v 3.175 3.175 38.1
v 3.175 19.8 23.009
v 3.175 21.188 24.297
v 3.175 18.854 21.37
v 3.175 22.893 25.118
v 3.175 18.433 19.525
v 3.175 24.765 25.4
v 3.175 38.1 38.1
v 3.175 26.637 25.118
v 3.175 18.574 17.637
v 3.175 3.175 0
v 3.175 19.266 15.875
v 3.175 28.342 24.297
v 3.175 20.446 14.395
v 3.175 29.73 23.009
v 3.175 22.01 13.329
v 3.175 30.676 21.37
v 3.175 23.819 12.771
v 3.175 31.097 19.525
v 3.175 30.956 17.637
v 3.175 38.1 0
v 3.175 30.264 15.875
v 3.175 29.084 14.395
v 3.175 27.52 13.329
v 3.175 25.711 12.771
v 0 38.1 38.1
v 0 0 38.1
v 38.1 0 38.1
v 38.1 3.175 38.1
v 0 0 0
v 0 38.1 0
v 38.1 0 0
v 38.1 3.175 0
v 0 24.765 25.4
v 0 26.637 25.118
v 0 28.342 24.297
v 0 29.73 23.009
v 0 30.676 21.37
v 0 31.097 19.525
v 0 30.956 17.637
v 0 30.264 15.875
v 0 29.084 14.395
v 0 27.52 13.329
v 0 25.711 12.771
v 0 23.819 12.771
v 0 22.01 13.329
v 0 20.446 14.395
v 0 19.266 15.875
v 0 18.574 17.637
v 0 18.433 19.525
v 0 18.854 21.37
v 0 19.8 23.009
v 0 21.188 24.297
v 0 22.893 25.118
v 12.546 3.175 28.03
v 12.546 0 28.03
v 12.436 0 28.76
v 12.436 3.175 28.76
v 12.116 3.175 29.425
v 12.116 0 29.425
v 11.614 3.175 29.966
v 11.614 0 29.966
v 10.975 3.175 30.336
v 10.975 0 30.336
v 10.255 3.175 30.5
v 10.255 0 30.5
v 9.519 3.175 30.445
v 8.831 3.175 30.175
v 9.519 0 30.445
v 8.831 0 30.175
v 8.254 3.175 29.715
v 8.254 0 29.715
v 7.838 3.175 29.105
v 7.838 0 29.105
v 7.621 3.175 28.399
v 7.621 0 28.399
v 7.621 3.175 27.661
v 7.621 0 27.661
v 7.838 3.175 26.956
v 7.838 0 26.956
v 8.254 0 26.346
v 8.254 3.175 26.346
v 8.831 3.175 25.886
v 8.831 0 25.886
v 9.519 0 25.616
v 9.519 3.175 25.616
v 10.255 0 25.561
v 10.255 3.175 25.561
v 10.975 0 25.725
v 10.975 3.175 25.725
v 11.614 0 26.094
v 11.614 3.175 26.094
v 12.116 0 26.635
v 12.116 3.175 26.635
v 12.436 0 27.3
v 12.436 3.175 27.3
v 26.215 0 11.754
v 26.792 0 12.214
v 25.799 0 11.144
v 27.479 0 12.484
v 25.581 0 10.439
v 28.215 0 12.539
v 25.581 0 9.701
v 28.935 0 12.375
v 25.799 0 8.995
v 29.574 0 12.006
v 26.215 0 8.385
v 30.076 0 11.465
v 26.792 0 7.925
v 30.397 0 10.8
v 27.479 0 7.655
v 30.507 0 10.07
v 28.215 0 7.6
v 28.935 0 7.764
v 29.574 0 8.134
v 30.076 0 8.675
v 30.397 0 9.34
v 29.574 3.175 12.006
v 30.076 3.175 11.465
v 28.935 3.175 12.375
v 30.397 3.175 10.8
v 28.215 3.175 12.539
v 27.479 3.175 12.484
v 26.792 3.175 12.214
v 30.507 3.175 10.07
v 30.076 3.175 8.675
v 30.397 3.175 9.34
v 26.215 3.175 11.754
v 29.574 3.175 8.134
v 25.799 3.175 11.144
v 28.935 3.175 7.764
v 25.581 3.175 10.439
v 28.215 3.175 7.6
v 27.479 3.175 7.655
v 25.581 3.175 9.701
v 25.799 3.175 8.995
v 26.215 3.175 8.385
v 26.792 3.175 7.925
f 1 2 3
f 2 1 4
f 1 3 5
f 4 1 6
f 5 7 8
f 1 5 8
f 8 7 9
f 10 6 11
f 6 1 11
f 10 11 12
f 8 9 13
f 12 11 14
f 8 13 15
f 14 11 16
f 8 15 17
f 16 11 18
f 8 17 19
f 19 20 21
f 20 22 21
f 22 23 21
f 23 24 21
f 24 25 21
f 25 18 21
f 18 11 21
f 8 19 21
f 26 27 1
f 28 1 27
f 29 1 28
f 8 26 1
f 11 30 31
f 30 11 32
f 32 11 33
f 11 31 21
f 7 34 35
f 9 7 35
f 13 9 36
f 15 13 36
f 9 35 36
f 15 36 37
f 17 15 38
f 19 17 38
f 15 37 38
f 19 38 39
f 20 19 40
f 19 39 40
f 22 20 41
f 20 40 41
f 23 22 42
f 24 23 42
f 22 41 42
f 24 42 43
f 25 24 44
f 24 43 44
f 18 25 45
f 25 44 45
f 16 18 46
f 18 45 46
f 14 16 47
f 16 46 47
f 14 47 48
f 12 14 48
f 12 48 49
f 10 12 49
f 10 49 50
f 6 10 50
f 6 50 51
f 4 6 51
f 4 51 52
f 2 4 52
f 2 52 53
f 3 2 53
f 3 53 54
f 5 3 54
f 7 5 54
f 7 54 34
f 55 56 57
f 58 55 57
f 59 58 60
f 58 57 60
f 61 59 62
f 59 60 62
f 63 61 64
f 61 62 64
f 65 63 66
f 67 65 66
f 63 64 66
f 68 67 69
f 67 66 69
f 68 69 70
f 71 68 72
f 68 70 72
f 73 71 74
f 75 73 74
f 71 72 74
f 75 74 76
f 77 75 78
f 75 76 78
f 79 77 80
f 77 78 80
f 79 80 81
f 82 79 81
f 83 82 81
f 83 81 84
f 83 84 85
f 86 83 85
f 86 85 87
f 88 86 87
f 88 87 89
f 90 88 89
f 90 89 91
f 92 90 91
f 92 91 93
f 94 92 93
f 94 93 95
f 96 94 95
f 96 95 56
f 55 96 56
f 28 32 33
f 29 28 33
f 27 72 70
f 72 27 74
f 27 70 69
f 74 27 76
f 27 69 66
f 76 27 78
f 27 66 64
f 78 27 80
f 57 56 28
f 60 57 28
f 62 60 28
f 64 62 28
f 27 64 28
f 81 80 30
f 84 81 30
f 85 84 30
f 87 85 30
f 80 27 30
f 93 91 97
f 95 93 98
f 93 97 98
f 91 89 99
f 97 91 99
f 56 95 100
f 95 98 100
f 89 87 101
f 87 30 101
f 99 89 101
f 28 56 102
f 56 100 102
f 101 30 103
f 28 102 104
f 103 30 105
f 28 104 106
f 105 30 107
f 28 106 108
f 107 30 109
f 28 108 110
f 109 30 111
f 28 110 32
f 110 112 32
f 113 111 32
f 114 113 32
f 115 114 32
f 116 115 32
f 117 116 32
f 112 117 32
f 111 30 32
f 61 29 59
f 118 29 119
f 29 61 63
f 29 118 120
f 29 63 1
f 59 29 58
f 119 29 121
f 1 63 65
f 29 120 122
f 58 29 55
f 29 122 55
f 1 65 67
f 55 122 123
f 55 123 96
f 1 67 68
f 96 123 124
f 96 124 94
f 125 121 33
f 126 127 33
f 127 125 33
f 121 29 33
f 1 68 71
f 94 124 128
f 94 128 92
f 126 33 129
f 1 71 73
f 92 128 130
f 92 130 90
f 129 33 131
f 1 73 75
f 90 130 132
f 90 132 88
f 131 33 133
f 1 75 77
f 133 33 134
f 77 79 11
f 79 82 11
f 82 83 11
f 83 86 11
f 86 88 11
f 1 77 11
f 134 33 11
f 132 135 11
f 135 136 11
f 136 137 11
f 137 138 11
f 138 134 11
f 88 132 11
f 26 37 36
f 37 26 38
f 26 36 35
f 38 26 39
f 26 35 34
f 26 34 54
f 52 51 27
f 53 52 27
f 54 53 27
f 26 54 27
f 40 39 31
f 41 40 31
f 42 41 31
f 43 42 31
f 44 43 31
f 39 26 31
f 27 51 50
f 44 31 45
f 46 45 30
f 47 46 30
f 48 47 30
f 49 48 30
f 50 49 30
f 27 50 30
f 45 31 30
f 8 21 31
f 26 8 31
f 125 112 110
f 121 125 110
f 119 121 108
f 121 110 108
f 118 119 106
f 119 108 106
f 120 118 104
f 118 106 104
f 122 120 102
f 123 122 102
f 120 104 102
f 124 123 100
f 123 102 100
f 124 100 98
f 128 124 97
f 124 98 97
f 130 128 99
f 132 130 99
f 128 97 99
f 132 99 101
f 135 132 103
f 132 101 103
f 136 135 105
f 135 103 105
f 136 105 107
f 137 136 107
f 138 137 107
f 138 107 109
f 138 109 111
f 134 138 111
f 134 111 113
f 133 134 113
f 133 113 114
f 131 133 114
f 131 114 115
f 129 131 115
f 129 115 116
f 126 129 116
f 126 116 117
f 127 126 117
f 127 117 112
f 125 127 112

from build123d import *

# Parameters (mm, degrees)
EXTRUDE_THIN1_DEPTH = 38.1
SKETCH2_R           = 6.35
CUT_EXTRUDE1_DEPTH  = 39.1
SKETCH3_R           = 2.4765
CUT_EXTRUDE2_DEPTH  = 39.1


with BuildPart() as part:
    # Sketch1 → Extrude-Thin1 (new body)
    with BuildSketch(Plane.XY):
        Polygon((0, 38.1), (0, 0), (38.1, 0), (38.1, 3.175), (3.175, 3.175), (3.175, 38.1), align=None)
    extrude(amount=EXTRUDE_THIN1_DEPTH)

    # Sketch2 → Cut-Extrude1 (cut, through all)
    with BuildSketch(Plane.ZY):
        with Locations((19.05, 24.765)):
            Circle(SKETCH2_R)
    extrude(amount=-CUT_EXTRUDE1_DEPTH, mode=Mode.SUBTRACT)

    # Sketch3 → Cut-Extrude2 (cut, through all)
    with BuildSketch(Plane.XZ):
        with Locations((28.030256121, 10.069743879)):
            Circle(SKETCH3_R)
        with Locations((10.069743879, 28.030256121)):
            Circle(SKETCH3_R)
    extrude(amount=-CUT_EXTRUDE2_DEPTH, mode=Mode.SUBTRACT)


solid = part.part
